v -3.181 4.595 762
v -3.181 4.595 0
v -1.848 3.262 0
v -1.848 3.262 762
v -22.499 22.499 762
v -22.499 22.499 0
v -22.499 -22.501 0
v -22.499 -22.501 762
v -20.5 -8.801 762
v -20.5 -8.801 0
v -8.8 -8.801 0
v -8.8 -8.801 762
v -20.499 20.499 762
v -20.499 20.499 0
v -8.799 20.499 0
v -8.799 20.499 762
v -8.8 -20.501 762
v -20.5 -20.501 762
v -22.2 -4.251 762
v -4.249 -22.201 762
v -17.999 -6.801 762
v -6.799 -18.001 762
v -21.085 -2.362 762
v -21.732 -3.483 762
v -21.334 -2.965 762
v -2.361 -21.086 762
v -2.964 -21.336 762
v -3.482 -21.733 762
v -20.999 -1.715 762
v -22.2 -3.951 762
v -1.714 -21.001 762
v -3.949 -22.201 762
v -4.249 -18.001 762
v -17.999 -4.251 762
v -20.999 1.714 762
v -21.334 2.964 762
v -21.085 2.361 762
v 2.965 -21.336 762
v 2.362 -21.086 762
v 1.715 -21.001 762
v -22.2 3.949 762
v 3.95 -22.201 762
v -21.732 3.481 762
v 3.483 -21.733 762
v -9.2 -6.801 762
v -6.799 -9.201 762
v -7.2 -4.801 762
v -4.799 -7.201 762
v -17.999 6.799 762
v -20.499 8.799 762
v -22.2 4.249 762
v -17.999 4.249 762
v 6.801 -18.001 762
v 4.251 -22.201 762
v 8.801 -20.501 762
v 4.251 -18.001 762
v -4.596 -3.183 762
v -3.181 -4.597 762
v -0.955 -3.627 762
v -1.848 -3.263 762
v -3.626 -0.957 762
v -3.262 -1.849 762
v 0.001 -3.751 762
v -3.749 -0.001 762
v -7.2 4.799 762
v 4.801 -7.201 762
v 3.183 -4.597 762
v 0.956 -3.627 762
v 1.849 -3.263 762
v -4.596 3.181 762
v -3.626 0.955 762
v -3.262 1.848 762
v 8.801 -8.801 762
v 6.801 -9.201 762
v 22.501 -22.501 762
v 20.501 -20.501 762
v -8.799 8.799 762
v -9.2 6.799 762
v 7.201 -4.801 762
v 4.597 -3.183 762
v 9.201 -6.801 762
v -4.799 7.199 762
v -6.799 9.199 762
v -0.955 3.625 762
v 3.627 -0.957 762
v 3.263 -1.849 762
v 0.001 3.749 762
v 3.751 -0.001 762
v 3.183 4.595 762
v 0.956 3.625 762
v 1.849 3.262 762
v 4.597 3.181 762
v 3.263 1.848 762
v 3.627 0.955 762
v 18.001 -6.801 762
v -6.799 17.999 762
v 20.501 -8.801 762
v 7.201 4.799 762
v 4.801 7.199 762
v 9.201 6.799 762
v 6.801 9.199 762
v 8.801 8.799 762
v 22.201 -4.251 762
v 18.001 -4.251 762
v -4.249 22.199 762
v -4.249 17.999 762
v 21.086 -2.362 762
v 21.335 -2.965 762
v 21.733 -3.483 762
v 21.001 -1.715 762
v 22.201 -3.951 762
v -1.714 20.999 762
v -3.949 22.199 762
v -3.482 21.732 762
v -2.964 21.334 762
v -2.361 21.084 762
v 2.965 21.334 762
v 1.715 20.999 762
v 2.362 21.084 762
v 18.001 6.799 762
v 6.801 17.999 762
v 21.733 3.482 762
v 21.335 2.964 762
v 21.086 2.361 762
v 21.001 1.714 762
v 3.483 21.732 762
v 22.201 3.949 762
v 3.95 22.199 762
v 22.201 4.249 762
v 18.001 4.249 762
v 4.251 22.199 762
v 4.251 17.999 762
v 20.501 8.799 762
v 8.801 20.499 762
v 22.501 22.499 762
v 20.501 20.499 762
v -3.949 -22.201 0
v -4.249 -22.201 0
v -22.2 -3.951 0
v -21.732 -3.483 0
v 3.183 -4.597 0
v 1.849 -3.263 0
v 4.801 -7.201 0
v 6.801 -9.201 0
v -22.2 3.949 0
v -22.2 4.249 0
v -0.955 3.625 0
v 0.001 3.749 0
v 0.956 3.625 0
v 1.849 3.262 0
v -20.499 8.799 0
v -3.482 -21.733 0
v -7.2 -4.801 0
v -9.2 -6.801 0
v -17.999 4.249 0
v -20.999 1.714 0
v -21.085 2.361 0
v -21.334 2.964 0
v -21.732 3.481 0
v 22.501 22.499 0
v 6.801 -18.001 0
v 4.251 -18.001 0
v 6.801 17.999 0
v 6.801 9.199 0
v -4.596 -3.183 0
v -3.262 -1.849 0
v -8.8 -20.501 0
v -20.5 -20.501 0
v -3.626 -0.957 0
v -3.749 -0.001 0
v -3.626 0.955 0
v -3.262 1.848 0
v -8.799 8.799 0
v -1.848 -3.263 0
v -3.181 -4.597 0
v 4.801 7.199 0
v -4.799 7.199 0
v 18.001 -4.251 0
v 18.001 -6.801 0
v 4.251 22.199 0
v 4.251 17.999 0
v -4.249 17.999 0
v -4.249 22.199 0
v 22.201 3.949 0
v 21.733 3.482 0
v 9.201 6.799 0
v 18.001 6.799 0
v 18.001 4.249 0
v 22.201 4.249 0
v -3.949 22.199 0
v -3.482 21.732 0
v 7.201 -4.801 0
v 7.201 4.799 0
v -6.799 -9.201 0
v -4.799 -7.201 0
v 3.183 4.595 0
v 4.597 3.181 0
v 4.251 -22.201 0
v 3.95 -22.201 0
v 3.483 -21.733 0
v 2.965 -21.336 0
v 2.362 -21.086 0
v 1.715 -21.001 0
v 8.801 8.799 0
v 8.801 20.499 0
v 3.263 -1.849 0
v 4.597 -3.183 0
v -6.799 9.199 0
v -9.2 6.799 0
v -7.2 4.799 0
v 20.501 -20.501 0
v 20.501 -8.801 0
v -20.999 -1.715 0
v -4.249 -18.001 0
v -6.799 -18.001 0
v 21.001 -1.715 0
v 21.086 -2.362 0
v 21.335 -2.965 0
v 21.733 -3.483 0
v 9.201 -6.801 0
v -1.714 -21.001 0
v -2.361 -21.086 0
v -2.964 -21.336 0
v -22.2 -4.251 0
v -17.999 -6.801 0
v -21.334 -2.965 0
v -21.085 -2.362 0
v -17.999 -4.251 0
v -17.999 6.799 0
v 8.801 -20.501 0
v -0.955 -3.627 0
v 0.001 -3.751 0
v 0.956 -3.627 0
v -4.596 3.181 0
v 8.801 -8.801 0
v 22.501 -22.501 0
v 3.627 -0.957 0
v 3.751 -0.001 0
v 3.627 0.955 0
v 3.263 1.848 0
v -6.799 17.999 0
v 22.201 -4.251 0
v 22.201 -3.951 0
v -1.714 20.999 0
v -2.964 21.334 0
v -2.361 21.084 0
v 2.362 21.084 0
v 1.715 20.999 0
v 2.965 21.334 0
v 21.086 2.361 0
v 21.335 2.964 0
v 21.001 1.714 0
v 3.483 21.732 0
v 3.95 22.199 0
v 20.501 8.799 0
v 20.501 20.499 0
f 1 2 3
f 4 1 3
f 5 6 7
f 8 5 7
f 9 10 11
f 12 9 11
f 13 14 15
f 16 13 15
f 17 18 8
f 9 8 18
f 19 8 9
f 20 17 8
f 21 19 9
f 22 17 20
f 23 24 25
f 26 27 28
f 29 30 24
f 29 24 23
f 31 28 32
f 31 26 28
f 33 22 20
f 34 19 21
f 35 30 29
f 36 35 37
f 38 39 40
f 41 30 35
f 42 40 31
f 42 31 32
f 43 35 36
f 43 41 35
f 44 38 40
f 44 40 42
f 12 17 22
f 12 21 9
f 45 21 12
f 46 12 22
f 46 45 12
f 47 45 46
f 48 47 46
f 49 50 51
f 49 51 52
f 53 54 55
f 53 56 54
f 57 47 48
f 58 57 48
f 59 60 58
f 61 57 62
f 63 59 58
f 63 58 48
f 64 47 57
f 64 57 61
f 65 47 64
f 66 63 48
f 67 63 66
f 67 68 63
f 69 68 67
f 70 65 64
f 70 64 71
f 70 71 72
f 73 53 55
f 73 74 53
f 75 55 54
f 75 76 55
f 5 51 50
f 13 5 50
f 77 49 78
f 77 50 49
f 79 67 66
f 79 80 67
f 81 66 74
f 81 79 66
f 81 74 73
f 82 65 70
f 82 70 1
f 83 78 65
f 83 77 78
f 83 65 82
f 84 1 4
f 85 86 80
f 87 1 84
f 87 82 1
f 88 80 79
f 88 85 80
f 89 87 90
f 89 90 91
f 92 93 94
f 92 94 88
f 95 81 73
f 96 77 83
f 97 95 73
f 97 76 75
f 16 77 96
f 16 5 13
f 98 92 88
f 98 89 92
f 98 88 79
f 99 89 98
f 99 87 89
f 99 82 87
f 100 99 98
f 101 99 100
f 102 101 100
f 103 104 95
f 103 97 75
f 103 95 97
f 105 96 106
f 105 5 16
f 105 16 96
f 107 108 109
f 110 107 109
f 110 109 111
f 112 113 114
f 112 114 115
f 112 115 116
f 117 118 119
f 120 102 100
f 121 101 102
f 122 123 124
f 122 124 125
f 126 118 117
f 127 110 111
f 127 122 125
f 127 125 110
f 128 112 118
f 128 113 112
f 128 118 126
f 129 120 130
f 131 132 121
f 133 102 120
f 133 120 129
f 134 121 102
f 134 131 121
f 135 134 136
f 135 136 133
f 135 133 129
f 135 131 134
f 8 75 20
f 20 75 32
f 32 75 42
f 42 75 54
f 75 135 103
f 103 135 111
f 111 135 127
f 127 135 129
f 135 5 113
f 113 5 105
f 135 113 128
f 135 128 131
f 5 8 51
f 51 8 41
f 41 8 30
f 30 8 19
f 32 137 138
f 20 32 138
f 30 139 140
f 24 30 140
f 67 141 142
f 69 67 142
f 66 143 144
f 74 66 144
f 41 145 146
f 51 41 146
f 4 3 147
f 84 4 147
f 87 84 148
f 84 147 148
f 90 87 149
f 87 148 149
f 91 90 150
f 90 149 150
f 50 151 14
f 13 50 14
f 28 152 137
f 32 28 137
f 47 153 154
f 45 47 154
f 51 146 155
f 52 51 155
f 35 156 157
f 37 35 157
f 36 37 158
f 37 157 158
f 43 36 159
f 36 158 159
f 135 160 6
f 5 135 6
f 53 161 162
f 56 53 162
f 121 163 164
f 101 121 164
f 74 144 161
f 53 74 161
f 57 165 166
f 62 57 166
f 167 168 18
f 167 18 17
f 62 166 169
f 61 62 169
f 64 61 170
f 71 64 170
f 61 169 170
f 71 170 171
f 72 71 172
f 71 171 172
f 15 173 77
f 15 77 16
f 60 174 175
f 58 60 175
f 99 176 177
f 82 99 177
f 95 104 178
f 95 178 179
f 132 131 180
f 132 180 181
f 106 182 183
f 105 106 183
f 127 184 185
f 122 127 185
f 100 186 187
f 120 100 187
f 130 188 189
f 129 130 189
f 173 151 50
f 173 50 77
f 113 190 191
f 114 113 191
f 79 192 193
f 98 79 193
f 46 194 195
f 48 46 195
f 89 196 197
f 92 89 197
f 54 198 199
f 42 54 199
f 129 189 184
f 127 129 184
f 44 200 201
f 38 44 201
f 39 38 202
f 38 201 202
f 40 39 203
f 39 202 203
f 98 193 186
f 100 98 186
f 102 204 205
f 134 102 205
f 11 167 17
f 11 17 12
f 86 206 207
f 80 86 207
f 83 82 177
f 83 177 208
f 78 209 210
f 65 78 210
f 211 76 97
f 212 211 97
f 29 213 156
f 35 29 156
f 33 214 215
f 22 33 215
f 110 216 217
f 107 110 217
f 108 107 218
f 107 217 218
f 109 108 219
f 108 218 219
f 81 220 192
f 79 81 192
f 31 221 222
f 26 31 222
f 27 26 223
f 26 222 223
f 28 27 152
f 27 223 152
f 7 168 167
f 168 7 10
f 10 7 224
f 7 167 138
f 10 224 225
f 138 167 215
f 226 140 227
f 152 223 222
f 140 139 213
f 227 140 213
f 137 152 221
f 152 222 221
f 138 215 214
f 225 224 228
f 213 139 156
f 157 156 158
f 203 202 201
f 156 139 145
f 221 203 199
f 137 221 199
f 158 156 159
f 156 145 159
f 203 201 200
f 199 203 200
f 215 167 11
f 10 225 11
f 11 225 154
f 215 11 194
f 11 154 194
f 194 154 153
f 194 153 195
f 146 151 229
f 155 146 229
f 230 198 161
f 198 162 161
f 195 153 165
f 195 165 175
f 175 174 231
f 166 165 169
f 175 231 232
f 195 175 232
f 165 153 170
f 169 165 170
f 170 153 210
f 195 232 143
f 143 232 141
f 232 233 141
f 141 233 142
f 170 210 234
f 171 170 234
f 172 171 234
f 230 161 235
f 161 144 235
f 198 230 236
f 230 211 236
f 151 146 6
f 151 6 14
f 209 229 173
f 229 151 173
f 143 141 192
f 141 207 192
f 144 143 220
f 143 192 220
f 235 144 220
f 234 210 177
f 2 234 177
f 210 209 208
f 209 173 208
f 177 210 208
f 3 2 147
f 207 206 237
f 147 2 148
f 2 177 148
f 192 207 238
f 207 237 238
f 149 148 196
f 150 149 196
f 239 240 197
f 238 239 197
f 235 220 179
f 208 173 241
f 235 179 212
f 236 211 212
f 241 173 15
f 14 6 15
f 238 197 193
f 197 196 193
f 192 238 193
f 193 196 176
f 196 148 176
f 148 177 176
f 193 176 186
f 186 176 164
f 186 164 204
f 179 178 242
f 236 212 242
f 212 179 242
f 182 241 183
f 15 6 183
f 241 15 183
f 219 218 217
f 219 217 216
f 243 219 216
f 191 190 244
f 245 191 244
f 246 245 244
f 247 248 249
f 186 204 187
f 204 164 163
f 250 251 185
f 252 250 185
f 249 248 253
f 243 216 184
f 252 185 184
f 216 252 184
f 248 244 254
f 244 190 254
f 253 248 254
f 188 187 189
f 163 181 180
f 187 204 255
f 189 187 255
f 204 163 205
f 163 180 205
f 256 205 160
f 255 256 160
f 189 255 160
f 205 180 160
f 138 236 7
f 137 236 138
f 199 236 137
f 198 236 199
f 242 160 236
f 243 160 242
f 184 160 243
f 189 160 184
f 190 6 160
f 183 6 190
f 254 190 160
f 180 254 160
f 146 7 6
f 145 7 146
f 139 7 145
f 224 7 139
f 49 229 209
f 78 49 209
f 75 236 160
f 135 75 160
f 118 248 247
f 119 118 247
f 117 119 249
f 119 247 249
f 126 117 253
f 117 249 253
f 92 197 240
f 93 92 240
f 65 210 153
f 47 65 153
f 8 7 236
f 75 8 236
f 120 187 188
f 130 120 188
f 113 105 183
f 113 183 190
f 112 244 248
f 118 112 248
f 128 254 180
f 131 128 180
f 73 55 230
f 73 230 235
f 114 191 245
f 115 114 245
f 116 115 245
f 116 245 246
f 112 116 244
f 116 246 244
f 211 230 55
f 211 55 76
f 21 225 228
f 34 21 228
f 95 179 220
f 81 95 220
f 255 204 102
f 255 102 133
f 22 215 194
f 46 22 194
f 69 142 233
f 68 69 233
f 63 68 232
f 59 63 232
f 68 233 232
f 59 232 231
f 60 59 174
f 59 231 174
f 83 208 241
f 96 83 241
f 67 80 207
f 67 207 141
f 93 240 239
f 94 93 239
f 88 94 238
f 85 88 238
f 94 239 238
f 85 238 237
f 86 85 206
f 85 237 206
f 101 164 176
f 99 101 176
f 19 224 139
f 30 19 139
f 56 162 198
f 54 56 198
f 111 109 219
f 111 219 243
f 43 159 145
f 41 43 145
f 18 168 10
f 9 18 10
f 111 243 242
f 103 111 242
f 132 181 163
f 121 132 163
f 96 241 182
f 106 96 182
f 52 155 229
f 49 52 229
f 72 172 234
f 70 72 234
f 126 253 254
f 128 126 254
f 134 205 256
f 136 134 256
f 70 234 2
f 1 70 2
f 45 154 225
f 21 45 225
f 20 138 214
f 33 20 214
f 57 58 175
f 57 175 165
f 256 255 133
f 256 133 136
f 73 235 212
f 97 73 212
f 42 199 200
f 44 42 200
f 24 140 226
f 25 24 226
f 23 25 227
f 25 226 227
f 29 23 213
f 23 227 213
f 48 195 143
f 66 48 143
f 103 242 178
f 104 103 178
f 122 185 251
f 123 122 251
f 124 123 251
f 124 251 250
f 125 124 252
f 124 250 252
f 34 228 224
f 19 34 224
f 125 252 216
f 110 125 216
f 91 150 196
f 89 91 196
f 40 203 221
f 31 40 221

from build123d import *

# Parameters (mm, degrees)
SKETCH1_W           = 11.699975178
SKETCH1_H           = 11.699996949
SKETCH1_W_2         = 11.699990436
SKETCH1_H_2         = 11.699981689
SKETCH1_W_3         = 11.699981689
SKETCH1_H_3         = 11.699990436
SKETCH1_W_4         = 11.699990437
SKETCH1_H_4         = 11.699975177
BOSS_EXTRUDE1_DEPTH = 762


with BuildPart() as part:
    # Sketch1 → Boss-Extrude1 (new body)
    with BuildSketch(Plane.XY):
        Polygon((-22.499484948, -22.500701346), (22.500514502, -22.500701895), (22.500515052, 22.499297556), (-22.499484399, 22.499298105), align=None)
        with Locations((-14.649542346, -14.650709384)):
            Rectangle(SKETCH1_W, SKETCH1_H, mode=Mode.SUBTRACT)
        with Locations((14.65050626, -14.650767962)):
            Rectangle(SKETCH1_W_2, SKETCH1_H_2, mode=Mode.SUBTRACT)
        with Locations((14.650561583, 14.6492839)):
            Rectangle(SKETCH1_W_3, SKETCH1_H_3, mode=Mode.SUBTRACT)
        with Locations((-14.64949028, 14.649335967)):
            Rectangle(SKETCH1_W_4, SKETCH1_H_4, mode=Mode.SUBTRACT)
        with BuildLine():
            Line((-22.199510799, -3.950696126), (-21.731790056, -3.48300681))
            ThreePointArc((-21.731790056, -3.48300681), (-21.189814855, -2.671927844), (-20.999497617, -1.71518046))
            Line((-20.999497617, -1.71518046), (-20.999497617, 1.713721031))
            ThreePointArc((-20.999497617, 1.713721031), (-21.189799286, 2.670430863), (-21.731732544, 3.481489907))
            Line((-21.731732544, 3.481489907), (-22.199510888, 3.949267256))
            Line((-22.199510888, 3.949267256), (-22.199510888, 4.249285566))
            Line((-22.199510888, 4.249285566), (-17.999497356, 4.249285704))
            Line((-17.999497356, 4.249285704), (-17.999497356, 6.79927354))
            Line((-17.999497356, 6.79927354), (-9.199509947, 6.799273828))
            Line((-9.199509947, 6.799273828), (-7.199509956, 4.799274012))
            Line((-7.199509956, 4.799274012), (-7.199509641, -4.800732197))
            Line((-7.199509641, -4.800732197), (-9.199509449, -6.800732179))
            Line((-9.199509449, -6.800732179), (-17.99949762, -6.800732468))
            Line((-17.99949762, -6.800732468), (-17.99949762, -4.250714253))
            Line((-17.99949762, -4.250714253), (-22.199510799, -4.250714391))
            Line((-22.199510799, -4.250714391), (-22.199510799, -3.950696126))
        make_face(mode=Mode.SUBTRACT)
        with BuildLine():
            Line((-6.799479919, -18.000719999), (-6.799480207, -9.200732353))
            Line((-6.799480207, -9.200732353), (-4.799480391, -7.200732362))
            Line((-4.799480391, -7.200732362), (4.800525817, -7.200732047))
            Line((4.800525817, -7.200732047), (6.8005258, -9.200731855))
            Line((6.8005258, -9.200731855), (6.800526088, -18.000720263))
            Line((6.800526088, -18.000720263), (4.250507877, -18.000720263))
            Line((4.250507877, -18.000720263), (4.250508015, -22.200733153))
            Line((4.250508015, -22.200733153), (3.950489751, -22.200733153))
            Line((3.950489751, -22.200733153), (3.482800434, -21.73301241))
            ThreePointArc((3.482800434, -21.73301241), (2.671721468, -21.191037209), (1.714974084, -21.000719971))
            Line((1.714974084, -21.000719971), (-1.713927407, -21.000719971))
            ThreePointArc((-1.713927407, -21.000719971), (-2.670637239, -21.19102164), (-3.481696283, -21.732954898))
            Line((-3.481696283, -21.732954898), (-3.949473632, -22.200733242))
            Line((-3.949473632, -22.200733242), (-4.249491942, -22.200733242))
            Line((-4.249491942, -22.200733242), (-4.24949208, -18.000719999))
            Line((-4.24949208, -18.000719999), (-6.799479919, -18.000719999))
        make_face(mode=Mode.SUBTRACT)
        with BuildLine():
            Line((7.200519471, -4.800702751), (7.200519156, 4.799303458))
            Line((7.200519156, 4.799303458), (9.200518964, 6.79930344))
            Line((9.200518964, 6.79930344), (18.000507424, 6.799303729))
            Line((18.000507424, 6.799303729), (18.000507424, 4.249285514))
            Line((18.000507424, 4.249285514), (22.200520261, 4.249285652))
            Line((22.200520261, 4.249285652), (22.200520261, 3.949267391))
            Line((22.200520261, 3.949267391), (21.732799519, 3.481578075))
            ThreePointArc((21.732799519, 3.481578075), (21.190824318, 2.670499108), (21.000507079, 1.713751724))
            Line((21.000507079, 1.713751724), (21.000507079, -1.715149766))
            ThreePointArc((21.000507079, -1.715149766), (21.190808749, -2.671859599), (21.732742007, -3.482918643))
            Line((21.732742007, -3.482918643), (22.200520351, -3.950695992))
            Line((22.200520351, -3.950695992), (22.200520351, -4.250714302))
            Line((22.200520351, -4.250714302), (18.000507108, -4.25071444))
            Line((18.000507108, -4.25071444), (18.000507108, -6.800702279))
            Line((18.000507108, -6.800702279), (9.200519462, -6.800702567))
            Line((9.200519462, -6.800702567), (7.200519471, -4.800702751))
        make_face(mode=Mode.SUBTRACT)
        with BuildLine():
            Line((-4.799479817, 7.199303635), (-6.799479854, 9.199304042))
            Line((-6.799479854, 9.199304042), (-6.799479244, 17.999291576))
            Line((-6.799479244, 17.999291576), (-4.249491247, 17.999291576))
            Line((-4.249491247, 17.999291576), (-4.249490956, 22.199304807))
            Line((-4.249490956, 22.199304807), (-3.949472548, 22.199304807))
            Line((-3.949472548, 22.199304807), (-3.481695222, 21.73152644))
            ThreePointArc((-3.481695222, 21.73152644), (-2.670636178, 21.189593132), (-1.713926324, 20.999291428))
            Line((-1.713926324, 20.999291428), (1.714975167, 20.999291428))
            ThreePointArc((1.714975167, 20.999291428), (2.671722509, 21.189608628), (3.482801459, 21.731583767))
            Line((3.482801459, 21.731583767), (3.950490798, 22.199304487))
            Line((3.950490798, 22.199304487), (4.250509108, 22.199304487))
            Line((4.250509108, 22.199304487), (4.250508817, 17.999291575))
            Line((4.250508817, 17.999291575), (6.800527063, 17.999291575))
            Line((6.800527063, 17.999291575), (6.800526453, 9.199302988))
            Line((6.800526453, 9.199302988), (4.800526064, 7.199302969))
            Line((4.800526064, 7.199302969), (-4.799479817, 7.199303635))
        make_face(mode=Mode.SUBTRACT)
        with BuildLine():
            Line((-4.595670829, -3.182694885), (-3.26221457, -1.849238626))
            ThreePointArc((-3.26221457, -1.849238626), (-3.749476751, -0.00071437), (-3.26221457, 1.847809887))
            Line((-3.26221457, 1.847809887), (-4.595670829, 3.181266146))
            Line((-4.595670829, 3.181266146), (-3.181457266, 4.595479708))
            Line((-3.181457266, 4.595479708), (-1.848001007, 3.262023449))
            ThreePointArc((-1.848001007, 3.262023449), (0.000523249, 3.74928563), (1.849047505, 3.262023449))
            Line((1.849047505, 3.262023449), (3.182503764, 4.595479708))
            Line((3.182503764, 4.595479708), (4.596717327, 3.181266146))
            Line((4.596717327, 3.181266146), (3.263261068, 1.847809887))
            ThreePointArc((3.263261068, 1.847809887), (3.750523249, -0.00071437), (3.263261068, -1.849238626))
            Line((3.263261068, -1.849238626), (4.596717327, -3.182694885))
            Line((4.596717327, -3.182694885), (3.182503764, -4.596908447))
            Line((3.182503764, -4.596908447), (1.849047505, -3.263452188))
            ThreePointArc((1.849047505, -3.263452188), (0.000523249, -3.75071437), (-1.848001007, -3.263452188))
            Line((-1.848001007, -3.263452188), (-3.181457266, -4.596908447))
            Line((-3.181457266, -4.596908447), (-4.595670829, -3.182694885))
        make_face(mode=Mode.SUBTRACT)
    extrude(amount=BOSS_EXTRUDE1_DEPTH)


solid = part.part
